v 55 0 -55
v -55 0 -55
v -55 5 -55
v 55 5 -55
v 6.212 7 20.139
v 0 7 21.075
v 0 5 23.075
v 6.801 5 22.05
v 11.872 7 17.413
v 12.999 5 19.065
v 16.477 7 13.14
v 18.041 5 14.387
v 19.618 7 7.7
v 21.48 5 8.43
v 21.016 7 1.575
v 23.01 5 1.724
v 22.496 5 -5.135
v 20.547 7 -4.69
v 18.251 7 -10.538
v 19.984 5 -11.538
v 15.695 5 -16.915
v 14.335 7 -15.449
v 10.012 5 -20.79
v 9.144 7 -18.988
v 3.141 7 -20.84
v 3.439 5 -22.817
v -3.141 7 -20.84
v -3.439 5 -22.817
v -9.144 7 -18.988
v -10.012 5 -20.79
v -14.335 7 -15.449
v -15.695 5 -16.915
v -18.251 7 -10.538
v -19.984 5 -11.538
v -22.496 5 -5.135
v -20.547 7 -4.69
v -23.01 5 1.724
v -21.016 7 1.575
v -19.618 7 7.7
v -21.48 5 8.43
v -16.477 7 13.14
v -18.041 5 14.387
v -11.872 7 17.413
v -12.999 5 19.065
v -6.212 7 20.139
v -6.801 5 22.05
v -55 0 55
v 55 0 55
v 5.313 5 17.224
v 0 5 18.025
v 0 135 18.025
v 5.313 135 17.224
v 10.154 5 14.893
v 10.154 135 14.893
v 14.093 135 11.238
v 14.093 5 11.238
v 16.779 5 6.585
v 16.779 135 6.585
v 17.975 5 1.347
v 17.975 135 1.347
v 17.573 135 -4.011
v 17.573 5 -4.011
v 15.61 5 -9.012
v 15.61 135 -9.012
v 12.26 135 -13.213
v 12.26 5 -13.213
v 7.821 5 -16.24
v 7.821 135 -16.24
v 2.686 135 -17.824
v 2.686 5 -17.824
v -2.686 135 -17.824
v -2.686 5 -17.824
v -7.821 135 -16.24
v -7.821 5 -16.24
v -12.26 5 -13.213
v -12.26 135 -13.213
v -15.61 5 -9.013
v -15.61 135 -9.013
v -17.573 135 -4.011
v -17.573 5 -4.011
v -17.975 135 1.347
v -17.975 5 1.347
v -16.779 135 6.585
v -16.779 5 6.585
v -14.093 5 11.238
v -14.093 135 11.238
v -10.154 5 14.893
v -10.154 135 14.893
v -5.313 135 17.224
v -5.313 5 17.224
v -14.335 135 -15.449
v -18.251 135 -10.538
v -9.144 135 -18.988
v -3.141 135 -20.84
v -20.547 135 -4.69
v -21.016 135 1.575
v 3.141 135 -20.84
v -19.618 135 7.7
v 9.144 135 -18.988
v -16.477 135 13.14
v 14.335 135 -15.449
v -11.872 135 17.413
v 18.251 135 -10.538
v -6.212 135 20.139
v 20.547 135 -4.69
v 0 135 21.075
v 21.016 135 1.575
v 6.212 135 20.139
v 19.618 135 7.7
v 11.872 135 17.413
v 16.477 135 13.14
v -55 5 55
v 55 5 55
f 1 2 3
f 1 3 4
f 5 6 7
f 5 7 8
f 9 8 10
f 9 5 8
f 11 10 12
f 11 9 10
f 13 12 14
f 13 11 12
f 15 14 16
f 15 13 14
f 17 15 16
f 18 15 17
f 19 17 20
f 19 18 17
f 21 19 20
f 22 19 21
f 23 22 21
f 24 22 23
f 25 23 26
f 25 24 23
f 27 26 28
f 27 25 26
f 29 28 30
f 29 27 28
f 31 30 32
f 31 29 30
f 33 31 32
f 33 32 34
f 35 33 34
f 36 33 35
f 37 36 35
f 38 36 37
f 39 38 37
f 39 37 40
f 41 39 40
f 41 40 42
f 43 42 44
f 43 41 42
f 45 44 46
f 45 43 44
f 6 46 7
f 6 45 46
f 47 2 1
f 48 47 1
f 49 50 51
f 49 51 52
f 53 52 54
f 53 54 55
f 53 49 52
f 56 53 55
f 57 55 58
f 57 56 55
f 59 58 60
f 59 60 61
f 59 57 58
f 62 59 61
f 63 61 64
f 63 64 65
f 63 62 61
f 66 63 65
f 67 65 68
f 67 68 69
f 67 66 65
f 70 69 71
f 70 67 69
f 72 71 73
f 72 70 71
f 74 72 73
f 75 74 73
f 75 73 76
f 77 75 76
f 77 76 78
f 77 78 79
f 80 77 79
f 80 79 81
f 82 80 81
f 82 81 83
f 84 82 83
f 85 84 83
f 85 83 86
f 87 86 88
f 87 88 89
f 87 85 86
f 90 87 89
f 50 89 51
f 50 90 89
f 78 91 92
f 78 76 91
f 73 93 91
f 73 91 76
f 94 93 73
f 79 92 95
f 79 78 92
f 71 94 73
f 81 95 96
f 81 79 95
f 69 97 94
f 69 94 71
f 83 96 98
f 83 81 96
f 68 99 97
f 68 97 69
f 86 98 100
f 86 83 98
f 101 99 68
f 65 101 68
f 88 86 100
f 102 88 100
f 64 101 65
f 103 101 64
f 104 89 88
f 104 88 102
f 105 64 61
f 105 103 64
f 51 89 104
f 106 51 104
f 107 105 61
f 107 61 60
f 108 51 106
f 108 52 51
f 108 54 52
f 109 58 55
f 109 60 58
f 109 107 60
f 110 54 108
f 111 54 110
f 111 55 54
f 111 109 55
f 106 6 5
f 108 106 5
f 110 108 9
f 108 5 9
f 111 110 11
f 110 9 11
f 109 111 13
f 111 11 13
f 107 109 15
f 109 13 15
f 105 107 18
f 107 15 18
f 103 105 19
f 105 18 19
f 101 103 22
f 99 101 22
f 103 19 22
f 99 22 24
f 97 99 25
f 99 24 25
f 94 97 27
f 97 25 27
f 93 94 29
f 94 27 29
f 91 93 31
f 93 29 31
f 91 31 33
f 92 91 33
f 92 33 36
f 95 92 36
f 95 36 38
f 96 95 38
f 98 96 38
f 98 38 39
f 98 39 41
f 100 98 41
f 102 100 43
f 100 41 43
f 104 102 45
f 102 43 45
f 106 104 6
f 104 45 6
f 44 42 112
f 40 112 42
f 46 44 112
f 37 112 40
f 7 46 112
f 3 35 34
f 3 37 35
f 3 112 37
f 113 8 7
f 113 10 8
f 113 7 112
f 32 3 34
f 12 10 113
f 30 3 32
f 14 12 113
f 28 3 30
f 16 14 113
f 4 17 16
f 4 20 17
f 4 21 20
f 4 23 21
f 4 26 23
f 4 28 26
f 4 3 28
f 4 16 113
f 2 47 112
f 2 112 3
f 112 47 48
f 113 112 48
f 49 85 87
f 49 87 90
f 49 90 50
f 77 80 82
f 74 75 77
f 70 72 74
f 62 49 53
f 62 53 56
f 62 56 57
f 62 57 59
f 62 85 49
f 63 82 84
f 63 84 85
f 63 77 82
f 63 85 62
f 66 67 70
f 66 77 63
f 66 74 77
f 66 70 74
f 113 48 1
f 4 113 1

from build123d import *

# Parameters (mm, degrees)
SKETCH1_W           = 110
SKETCH1_H           = 110
BOSS_EXTRUDE1_DEPTH = 5
SKETCH2_R           = 21.075
SKETCH2_R_2         = 18.025
BOSS_EXTRUDE2_DEPTH = 130
CHAMFER1_SIZE       = 2


with BuildPart() as part:
    # Sketch1 → Boss-Extrude1 (new body)
    with BuildSketch(Plane(origin=(0, 0, 0), x_dir=(1, 0, 0), z_dir=(0, 1, 0))):
        Rectangle(SKETCH1_W, SKETCH1_H)
    extrude(amount=BOSS_EXTRUDE1_DEPTH)

    # Sketch2 → Boss-Extrude2 (add)
    with BuildSketch(Plane(origin=(0, 5, 0), x_dir=(1, 0, 0), z_dir=(0, 1, 0))):
        with Locations(Location((0, 0, 0), (0, 0, 270))):
            Circle(SKETCH2_R)
        with Locations(Location((0, 0, 0), (0, 0, 270))):
            Circle(SKETCH2_R_2, mode=Mode.SUBTRACT)
    extrude(amount=BOSS_EXTRUDE2_DEPTH)

    # Chamfer1
    chamfer1_edges = [part.edges().sort_by_distance(p)[0] for p in [
        (0, 5, -21.075),
    ]]
    chamfer(chamfer1_edges, length=CHAMFER1_SIZE)


solid = part.part
